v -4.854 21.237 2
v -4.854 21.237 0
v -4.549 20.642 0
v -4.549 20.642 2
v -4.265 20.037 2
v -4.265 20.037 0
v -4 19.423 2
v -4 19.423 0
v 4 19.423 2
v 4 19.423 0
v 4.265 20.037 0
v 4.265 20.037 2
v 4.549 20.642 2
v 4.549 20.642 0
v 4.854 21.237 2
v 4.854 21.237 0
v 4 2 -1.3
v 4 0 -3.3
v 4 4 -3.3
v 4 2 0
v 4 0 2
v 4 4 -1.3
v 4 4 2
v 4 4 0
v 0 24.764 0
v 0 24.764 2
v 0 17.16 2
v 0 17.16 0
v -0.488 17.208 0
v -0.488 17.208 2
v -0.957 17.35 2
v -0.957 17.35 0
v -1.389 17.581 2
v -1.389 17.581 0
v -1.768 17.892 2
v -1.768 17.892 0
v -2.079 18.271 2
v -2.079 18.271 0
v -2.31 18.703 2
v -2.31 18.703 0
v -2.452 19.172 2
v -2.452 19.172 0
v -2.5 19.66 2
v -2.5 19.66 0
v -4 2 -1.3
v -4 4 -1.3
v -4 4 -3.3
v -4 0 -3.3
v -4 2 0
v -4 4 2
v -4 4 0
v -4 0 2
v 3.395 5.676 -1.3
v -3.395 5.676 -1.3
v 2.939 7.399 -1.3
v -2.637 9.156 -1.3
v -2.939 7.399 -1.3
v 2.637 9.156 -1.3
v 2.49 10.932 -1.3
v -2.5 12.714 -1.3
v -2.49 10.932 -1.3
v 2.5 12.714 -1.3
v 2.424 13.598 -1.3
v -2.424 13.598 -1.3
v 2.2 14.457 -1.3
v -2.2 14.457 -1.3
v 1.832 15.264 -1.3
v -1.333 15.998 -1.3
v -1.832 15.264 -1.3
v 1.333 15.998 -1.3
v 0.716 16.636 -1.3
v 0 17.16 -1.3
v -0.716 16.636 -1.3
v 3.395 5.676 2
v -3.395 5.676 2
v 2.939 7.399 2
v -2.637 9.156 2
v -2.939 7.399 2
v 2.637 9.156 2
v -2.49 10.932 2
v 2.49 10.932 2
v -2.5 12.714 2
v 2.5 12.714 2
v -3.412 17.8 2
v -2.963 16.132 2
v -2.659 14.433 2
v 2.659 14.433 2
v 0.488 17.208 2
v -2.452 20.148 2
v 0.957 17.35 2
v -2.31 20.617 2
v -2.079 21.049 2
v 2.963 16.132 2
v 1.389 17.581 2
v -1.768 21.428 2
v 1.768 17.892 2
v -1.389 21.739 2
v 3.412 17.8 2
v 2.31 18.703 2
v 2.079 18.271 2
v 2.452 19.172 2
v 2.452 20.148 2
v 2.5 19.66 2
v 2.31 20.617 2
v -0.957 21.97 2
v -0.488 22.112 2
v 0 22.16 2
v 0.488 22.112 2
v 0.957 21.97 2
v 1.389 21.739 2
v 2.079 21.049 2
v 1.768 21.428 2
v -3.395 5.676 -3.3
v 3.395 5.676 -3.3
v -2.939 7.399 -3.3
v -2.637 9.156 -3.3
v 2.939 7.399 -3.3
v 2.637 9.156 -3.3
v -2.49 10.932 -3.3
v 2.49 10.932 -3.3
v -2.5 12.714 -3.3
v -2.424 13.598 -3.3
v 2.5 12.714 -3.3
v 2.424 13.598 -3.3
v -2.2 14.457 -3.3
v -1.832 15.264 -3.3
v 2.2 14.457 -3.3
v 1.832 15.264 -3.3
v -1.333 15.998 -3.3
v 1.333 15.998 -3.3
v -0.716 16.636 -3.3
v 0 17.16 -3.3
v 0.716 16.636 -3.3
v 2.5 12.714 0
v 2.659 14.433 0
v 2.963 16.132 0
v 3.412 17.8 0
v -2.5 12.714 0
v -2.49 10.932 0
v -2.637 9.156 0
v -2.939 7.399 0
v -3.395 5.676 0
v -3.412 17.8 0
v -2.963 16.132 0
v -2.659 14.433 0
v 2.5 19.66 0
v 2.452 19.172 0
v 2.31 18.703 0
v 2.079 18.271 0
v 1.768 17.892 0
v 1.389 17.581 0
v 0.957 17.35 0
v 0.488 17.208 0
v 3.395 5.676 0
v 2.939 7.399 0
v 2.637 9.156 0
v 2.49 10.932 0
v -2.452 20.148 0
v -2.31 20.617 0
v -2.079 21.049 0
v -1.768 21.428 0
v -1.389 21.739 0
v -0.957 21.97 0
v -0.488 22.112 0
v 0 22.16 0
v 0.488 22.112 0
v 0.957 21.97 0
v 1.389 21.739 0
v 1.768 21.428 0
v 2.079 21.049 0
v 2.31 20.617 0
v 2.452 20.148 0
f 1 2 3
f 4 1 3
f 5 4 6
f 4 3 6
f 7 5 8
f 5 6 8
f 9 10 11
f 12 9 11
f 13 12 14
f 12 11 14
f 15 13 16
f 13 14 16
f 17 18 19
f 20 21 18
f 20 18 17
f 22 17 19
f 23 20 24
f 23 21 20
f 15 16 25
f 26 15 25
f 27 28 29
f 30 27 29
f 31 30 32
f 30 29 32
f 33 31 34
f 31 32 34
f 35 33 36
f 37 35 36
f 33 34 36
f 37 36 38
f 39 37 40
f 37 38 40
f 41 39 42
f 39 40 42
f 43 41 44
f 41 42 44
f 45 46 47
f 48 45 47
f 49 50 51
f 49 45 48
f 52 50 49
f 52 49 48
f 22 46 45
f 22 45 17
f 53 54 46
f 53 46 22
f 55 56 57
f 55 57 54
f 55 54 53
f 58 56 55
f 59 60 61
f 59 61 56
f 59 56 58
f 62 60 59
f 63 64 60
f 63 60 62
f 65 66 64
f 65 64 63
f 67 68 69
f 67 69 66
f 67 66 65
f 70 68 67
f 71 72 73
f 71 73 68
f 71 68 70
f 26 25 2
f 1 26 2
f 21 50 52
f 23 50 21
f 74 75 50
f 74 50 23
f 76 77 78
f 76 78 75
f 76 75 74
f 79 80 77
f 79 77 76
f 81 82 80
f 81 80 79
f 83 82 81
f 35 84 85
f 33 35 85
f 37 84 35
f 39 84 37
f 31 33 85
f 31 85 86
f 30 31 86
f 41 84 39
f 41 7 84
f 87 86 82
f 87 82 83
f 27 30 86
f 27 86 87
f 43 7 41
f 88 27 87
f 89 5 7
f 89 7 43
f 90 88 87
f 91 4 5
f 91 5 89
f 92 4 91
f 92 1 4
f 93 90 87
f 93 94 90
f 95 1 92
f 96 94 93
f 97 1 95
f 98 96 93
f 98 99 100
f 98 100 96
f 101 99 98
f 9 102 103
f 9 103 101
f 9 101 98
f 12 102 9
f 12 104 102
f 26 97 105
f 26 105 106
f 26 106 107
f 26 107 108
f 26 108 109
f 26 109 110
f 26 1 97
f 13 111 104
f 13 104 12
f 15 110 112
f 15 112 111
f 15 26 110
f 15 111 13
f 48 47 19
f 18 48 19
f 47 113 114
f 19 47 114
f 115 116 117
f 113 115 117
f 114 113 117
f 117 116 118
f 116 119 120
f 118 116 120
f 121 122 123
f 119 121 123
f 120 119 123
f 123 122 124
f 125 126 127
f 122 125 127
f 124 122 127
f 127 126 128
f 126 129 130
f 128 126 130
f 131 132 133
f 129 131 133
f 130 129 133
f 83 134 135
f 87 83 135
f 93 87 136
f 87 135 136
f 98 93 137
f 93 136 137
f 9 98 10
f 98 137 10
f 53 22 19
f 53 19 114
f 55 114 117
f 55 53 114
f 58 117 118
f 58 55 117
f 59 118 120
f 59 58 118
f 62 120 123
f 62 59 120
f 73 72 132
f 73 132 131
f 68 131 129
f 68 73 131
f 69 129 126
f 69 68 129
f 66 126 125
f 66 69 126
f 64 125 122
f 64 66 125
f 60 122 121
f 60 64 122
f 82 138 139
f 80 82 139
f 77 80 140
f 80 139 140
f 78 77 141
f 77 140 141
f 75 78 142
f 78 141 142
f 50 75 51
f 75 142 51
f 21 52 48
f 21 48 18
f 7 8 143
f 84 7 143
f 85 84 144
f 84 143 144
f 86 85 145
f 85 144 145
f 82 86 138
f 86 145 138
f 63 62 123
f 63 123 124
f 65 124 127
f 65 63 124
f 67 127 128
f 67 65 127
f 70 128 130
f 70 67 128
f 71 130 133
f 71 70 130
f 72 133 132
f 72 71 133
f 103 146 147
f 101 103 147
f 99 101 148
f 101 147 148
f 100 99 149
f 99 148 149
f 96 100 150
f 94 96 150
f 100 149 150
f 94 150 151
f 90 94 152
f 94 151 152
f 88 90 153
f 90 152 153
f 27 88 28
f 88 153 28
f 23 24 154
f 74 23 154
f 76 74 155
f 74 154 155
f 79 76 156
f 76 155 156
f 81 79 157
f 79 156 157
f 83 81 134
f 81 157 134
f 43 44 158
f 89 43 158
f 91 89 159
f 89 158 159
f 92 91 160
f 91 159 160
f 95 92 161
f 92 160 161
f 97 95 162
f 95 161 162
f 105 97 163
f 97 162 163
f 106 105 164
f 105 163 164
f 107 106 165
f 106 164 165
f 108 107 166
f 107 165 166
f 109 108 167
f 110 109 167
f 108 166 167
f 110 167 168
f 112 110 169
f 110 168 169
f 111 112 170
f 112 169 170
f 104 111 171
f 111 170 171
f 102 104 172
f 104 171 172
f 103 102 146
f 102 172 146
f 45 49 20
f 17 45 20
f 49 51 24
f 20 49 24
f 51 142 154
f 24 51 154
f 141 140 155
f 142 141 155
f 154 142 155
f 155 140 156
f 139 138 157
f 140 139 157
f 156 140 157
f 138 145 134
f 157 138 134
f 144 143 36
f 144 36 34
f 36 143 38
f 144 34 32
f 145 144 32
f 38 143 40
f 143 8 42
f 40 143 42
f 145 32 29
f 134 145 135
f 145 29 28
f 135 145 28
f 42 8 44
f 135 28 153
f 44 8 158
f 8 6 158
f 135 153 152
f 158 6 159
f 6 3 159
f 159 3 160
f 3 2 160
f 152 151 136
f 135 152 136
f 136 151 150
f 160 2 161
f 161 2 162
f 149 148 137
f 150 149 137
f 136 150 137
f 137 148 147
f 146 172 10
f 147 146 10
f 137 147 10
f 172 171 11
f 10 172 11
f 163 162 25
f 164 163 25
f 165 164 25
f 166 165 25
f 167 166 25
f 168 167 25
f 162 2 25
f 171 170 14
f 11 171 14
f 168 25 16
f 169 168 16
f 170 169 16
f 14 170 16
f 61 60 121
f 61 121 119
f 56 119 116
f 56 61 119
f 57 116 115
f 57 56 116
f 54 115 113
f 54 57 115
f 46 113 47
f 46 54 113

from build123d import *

# Parameters (mm, degrees)
F0_W     = 8
F0_H     = 2
F1_DEPTH = 2
F2_DEPTH = 1.3
F3_START = -1.3
F3_DEPTH = 2


with BuildPart() as f1:
    # F0 (on Top) → F1 (new body)
    with BuildSketch(Plane.XY):
        with BuildLine():
            ThreePointArc((-2.5, 19.66), (0, 22.16), (2.5, 19.66))
            Line((2.5, 19.66), (4, 19.66))
            Line((4, 19.66), (4, 19.422723854))
            ThreePointArc((4, 19.422723854), (4.4045880471, 20.3405322852), (4.8541019662, 21.2371933364))
            Line((4.8541019662, 21.2371933364), (0, 24.7639048501))
            Line((0, 24.7639048501), (-4.8541019662, 21.2371933364))
            ThreePointArc((-4.8541019662, 21.2371933364), (-4.4045880471, 20.3405322852), (-4, 19.422723854))
            Line((-4, 19.422723854), (-4, 19.66))
            Line((-4, 19.66), (-2.5, 19.66))
        make_face()
        with BuildLine():
            ThreePointArc((2.5, 12.7140819367), (1.8321382954, 15.2643852238), (0, 17.16))
            ThreePointArc((0, 17.16), (-1.8321382954, 15.2643852238), (-2.5, 12.7140819367))
            ThreePointArc((-2.5, 12.7140819367), (-2.7688401868, 8.2742164407), (-4, 4))
            Line((-4, 4), (-4, 2))
            Line((-4, 2), (4, 2))
            Line((4, 2), (4, 4))
            ThreePointArc((4, 4), (2.7688401868, 8.2742164407), (2.5, 12.7140819367))
        make_face()
        with Locations((0, 1)):
            Rectangle(F0_W, F0_H)
        with BuildLine():
            ThreePointArc((0, 17.16), (-1.767766953, 17.892233047), (-2.5, 19.66))
            Line((-2.5, 19.66), (-2.5, 12.7140819367))
            ThreePointArc((-2.5, 12.7140819367), (-1.8321382954, 15.2643852238), (0, 17.16))
        make_face()
        with BuildLine():
            Line((2.5, 12.7140819367), (2.5, 19.66))
            ThreePointArc((2.5, 19.66), (1.767766953, 17.892233047), (0, 17.16))
            ThreePointArc((0, 17.16), (1.8321382954, 15.2643852238), (2.5, 12.7140819367))
        make_face()
        with BuildLine():
            Line((-2.5, 12.7140819367), (-2.5, 19.66))
            Line((-2.5, 19.66), (-4, 19.66))
            Line((-4, 19.66), (-4, 19.422723854))
            ThreePointArc((-4, 19.422723854), (-2.9634091525, 16.1324823732), (-2.5, 12.7140819367))
        make_face()
        with BuildLine():
            Line((4, 19.66), (2.5, 19.66))
            Line((2.5, 19.66), (2.5, 12.7140819367))
            ThreePointArc((2.5, 12.7140819367), (2.9634091525, 16.1324823732), (4, 19.422723854))
            Line((4, 19.422723854), (4, 19.66))
        make_face()
    extrude(amount=F1_DEPTH)

    # F0 (on Top) → F2 (join)
    with BuildSketch(Plane.XY):
        with Locations((0, 1)):
            Rectangle(F0_W, F0_H)
    extrude(amount=-F2_DEPTH)

    # F0 (on Top) → F3 (join)
    with BuildSketch(Plane.XY.offset(F3_START)):
        with BuildLine():
            ThreePointArc((2.5, 12.7140819367), (1.8321382954, 15.2643852238), (0, 17.16))
            ThreePointArc((0, 17.16), (-1.8321382954, 15.2643852238), (-2.5, 12.7140819367))
            ThreePointArc((-2.5, 12.7140819367), (-2.7688401868, 8.2742164407), (-4, 4))
            Line((-4, 4), (-4, 2))
            Line((-4, 2), (4, 2))
            Line((4, 2), (4, 4))
            ThreePointArc((4, 4), (2.7688401868, 8.2742164407), (2.5, 12.7140819367))
        make_face()
        with Locations((0, 1)):
            Rectangle(F0_W, F0_H)
    extrude(amount=-F3_DEPTH)


solid = f1.part
